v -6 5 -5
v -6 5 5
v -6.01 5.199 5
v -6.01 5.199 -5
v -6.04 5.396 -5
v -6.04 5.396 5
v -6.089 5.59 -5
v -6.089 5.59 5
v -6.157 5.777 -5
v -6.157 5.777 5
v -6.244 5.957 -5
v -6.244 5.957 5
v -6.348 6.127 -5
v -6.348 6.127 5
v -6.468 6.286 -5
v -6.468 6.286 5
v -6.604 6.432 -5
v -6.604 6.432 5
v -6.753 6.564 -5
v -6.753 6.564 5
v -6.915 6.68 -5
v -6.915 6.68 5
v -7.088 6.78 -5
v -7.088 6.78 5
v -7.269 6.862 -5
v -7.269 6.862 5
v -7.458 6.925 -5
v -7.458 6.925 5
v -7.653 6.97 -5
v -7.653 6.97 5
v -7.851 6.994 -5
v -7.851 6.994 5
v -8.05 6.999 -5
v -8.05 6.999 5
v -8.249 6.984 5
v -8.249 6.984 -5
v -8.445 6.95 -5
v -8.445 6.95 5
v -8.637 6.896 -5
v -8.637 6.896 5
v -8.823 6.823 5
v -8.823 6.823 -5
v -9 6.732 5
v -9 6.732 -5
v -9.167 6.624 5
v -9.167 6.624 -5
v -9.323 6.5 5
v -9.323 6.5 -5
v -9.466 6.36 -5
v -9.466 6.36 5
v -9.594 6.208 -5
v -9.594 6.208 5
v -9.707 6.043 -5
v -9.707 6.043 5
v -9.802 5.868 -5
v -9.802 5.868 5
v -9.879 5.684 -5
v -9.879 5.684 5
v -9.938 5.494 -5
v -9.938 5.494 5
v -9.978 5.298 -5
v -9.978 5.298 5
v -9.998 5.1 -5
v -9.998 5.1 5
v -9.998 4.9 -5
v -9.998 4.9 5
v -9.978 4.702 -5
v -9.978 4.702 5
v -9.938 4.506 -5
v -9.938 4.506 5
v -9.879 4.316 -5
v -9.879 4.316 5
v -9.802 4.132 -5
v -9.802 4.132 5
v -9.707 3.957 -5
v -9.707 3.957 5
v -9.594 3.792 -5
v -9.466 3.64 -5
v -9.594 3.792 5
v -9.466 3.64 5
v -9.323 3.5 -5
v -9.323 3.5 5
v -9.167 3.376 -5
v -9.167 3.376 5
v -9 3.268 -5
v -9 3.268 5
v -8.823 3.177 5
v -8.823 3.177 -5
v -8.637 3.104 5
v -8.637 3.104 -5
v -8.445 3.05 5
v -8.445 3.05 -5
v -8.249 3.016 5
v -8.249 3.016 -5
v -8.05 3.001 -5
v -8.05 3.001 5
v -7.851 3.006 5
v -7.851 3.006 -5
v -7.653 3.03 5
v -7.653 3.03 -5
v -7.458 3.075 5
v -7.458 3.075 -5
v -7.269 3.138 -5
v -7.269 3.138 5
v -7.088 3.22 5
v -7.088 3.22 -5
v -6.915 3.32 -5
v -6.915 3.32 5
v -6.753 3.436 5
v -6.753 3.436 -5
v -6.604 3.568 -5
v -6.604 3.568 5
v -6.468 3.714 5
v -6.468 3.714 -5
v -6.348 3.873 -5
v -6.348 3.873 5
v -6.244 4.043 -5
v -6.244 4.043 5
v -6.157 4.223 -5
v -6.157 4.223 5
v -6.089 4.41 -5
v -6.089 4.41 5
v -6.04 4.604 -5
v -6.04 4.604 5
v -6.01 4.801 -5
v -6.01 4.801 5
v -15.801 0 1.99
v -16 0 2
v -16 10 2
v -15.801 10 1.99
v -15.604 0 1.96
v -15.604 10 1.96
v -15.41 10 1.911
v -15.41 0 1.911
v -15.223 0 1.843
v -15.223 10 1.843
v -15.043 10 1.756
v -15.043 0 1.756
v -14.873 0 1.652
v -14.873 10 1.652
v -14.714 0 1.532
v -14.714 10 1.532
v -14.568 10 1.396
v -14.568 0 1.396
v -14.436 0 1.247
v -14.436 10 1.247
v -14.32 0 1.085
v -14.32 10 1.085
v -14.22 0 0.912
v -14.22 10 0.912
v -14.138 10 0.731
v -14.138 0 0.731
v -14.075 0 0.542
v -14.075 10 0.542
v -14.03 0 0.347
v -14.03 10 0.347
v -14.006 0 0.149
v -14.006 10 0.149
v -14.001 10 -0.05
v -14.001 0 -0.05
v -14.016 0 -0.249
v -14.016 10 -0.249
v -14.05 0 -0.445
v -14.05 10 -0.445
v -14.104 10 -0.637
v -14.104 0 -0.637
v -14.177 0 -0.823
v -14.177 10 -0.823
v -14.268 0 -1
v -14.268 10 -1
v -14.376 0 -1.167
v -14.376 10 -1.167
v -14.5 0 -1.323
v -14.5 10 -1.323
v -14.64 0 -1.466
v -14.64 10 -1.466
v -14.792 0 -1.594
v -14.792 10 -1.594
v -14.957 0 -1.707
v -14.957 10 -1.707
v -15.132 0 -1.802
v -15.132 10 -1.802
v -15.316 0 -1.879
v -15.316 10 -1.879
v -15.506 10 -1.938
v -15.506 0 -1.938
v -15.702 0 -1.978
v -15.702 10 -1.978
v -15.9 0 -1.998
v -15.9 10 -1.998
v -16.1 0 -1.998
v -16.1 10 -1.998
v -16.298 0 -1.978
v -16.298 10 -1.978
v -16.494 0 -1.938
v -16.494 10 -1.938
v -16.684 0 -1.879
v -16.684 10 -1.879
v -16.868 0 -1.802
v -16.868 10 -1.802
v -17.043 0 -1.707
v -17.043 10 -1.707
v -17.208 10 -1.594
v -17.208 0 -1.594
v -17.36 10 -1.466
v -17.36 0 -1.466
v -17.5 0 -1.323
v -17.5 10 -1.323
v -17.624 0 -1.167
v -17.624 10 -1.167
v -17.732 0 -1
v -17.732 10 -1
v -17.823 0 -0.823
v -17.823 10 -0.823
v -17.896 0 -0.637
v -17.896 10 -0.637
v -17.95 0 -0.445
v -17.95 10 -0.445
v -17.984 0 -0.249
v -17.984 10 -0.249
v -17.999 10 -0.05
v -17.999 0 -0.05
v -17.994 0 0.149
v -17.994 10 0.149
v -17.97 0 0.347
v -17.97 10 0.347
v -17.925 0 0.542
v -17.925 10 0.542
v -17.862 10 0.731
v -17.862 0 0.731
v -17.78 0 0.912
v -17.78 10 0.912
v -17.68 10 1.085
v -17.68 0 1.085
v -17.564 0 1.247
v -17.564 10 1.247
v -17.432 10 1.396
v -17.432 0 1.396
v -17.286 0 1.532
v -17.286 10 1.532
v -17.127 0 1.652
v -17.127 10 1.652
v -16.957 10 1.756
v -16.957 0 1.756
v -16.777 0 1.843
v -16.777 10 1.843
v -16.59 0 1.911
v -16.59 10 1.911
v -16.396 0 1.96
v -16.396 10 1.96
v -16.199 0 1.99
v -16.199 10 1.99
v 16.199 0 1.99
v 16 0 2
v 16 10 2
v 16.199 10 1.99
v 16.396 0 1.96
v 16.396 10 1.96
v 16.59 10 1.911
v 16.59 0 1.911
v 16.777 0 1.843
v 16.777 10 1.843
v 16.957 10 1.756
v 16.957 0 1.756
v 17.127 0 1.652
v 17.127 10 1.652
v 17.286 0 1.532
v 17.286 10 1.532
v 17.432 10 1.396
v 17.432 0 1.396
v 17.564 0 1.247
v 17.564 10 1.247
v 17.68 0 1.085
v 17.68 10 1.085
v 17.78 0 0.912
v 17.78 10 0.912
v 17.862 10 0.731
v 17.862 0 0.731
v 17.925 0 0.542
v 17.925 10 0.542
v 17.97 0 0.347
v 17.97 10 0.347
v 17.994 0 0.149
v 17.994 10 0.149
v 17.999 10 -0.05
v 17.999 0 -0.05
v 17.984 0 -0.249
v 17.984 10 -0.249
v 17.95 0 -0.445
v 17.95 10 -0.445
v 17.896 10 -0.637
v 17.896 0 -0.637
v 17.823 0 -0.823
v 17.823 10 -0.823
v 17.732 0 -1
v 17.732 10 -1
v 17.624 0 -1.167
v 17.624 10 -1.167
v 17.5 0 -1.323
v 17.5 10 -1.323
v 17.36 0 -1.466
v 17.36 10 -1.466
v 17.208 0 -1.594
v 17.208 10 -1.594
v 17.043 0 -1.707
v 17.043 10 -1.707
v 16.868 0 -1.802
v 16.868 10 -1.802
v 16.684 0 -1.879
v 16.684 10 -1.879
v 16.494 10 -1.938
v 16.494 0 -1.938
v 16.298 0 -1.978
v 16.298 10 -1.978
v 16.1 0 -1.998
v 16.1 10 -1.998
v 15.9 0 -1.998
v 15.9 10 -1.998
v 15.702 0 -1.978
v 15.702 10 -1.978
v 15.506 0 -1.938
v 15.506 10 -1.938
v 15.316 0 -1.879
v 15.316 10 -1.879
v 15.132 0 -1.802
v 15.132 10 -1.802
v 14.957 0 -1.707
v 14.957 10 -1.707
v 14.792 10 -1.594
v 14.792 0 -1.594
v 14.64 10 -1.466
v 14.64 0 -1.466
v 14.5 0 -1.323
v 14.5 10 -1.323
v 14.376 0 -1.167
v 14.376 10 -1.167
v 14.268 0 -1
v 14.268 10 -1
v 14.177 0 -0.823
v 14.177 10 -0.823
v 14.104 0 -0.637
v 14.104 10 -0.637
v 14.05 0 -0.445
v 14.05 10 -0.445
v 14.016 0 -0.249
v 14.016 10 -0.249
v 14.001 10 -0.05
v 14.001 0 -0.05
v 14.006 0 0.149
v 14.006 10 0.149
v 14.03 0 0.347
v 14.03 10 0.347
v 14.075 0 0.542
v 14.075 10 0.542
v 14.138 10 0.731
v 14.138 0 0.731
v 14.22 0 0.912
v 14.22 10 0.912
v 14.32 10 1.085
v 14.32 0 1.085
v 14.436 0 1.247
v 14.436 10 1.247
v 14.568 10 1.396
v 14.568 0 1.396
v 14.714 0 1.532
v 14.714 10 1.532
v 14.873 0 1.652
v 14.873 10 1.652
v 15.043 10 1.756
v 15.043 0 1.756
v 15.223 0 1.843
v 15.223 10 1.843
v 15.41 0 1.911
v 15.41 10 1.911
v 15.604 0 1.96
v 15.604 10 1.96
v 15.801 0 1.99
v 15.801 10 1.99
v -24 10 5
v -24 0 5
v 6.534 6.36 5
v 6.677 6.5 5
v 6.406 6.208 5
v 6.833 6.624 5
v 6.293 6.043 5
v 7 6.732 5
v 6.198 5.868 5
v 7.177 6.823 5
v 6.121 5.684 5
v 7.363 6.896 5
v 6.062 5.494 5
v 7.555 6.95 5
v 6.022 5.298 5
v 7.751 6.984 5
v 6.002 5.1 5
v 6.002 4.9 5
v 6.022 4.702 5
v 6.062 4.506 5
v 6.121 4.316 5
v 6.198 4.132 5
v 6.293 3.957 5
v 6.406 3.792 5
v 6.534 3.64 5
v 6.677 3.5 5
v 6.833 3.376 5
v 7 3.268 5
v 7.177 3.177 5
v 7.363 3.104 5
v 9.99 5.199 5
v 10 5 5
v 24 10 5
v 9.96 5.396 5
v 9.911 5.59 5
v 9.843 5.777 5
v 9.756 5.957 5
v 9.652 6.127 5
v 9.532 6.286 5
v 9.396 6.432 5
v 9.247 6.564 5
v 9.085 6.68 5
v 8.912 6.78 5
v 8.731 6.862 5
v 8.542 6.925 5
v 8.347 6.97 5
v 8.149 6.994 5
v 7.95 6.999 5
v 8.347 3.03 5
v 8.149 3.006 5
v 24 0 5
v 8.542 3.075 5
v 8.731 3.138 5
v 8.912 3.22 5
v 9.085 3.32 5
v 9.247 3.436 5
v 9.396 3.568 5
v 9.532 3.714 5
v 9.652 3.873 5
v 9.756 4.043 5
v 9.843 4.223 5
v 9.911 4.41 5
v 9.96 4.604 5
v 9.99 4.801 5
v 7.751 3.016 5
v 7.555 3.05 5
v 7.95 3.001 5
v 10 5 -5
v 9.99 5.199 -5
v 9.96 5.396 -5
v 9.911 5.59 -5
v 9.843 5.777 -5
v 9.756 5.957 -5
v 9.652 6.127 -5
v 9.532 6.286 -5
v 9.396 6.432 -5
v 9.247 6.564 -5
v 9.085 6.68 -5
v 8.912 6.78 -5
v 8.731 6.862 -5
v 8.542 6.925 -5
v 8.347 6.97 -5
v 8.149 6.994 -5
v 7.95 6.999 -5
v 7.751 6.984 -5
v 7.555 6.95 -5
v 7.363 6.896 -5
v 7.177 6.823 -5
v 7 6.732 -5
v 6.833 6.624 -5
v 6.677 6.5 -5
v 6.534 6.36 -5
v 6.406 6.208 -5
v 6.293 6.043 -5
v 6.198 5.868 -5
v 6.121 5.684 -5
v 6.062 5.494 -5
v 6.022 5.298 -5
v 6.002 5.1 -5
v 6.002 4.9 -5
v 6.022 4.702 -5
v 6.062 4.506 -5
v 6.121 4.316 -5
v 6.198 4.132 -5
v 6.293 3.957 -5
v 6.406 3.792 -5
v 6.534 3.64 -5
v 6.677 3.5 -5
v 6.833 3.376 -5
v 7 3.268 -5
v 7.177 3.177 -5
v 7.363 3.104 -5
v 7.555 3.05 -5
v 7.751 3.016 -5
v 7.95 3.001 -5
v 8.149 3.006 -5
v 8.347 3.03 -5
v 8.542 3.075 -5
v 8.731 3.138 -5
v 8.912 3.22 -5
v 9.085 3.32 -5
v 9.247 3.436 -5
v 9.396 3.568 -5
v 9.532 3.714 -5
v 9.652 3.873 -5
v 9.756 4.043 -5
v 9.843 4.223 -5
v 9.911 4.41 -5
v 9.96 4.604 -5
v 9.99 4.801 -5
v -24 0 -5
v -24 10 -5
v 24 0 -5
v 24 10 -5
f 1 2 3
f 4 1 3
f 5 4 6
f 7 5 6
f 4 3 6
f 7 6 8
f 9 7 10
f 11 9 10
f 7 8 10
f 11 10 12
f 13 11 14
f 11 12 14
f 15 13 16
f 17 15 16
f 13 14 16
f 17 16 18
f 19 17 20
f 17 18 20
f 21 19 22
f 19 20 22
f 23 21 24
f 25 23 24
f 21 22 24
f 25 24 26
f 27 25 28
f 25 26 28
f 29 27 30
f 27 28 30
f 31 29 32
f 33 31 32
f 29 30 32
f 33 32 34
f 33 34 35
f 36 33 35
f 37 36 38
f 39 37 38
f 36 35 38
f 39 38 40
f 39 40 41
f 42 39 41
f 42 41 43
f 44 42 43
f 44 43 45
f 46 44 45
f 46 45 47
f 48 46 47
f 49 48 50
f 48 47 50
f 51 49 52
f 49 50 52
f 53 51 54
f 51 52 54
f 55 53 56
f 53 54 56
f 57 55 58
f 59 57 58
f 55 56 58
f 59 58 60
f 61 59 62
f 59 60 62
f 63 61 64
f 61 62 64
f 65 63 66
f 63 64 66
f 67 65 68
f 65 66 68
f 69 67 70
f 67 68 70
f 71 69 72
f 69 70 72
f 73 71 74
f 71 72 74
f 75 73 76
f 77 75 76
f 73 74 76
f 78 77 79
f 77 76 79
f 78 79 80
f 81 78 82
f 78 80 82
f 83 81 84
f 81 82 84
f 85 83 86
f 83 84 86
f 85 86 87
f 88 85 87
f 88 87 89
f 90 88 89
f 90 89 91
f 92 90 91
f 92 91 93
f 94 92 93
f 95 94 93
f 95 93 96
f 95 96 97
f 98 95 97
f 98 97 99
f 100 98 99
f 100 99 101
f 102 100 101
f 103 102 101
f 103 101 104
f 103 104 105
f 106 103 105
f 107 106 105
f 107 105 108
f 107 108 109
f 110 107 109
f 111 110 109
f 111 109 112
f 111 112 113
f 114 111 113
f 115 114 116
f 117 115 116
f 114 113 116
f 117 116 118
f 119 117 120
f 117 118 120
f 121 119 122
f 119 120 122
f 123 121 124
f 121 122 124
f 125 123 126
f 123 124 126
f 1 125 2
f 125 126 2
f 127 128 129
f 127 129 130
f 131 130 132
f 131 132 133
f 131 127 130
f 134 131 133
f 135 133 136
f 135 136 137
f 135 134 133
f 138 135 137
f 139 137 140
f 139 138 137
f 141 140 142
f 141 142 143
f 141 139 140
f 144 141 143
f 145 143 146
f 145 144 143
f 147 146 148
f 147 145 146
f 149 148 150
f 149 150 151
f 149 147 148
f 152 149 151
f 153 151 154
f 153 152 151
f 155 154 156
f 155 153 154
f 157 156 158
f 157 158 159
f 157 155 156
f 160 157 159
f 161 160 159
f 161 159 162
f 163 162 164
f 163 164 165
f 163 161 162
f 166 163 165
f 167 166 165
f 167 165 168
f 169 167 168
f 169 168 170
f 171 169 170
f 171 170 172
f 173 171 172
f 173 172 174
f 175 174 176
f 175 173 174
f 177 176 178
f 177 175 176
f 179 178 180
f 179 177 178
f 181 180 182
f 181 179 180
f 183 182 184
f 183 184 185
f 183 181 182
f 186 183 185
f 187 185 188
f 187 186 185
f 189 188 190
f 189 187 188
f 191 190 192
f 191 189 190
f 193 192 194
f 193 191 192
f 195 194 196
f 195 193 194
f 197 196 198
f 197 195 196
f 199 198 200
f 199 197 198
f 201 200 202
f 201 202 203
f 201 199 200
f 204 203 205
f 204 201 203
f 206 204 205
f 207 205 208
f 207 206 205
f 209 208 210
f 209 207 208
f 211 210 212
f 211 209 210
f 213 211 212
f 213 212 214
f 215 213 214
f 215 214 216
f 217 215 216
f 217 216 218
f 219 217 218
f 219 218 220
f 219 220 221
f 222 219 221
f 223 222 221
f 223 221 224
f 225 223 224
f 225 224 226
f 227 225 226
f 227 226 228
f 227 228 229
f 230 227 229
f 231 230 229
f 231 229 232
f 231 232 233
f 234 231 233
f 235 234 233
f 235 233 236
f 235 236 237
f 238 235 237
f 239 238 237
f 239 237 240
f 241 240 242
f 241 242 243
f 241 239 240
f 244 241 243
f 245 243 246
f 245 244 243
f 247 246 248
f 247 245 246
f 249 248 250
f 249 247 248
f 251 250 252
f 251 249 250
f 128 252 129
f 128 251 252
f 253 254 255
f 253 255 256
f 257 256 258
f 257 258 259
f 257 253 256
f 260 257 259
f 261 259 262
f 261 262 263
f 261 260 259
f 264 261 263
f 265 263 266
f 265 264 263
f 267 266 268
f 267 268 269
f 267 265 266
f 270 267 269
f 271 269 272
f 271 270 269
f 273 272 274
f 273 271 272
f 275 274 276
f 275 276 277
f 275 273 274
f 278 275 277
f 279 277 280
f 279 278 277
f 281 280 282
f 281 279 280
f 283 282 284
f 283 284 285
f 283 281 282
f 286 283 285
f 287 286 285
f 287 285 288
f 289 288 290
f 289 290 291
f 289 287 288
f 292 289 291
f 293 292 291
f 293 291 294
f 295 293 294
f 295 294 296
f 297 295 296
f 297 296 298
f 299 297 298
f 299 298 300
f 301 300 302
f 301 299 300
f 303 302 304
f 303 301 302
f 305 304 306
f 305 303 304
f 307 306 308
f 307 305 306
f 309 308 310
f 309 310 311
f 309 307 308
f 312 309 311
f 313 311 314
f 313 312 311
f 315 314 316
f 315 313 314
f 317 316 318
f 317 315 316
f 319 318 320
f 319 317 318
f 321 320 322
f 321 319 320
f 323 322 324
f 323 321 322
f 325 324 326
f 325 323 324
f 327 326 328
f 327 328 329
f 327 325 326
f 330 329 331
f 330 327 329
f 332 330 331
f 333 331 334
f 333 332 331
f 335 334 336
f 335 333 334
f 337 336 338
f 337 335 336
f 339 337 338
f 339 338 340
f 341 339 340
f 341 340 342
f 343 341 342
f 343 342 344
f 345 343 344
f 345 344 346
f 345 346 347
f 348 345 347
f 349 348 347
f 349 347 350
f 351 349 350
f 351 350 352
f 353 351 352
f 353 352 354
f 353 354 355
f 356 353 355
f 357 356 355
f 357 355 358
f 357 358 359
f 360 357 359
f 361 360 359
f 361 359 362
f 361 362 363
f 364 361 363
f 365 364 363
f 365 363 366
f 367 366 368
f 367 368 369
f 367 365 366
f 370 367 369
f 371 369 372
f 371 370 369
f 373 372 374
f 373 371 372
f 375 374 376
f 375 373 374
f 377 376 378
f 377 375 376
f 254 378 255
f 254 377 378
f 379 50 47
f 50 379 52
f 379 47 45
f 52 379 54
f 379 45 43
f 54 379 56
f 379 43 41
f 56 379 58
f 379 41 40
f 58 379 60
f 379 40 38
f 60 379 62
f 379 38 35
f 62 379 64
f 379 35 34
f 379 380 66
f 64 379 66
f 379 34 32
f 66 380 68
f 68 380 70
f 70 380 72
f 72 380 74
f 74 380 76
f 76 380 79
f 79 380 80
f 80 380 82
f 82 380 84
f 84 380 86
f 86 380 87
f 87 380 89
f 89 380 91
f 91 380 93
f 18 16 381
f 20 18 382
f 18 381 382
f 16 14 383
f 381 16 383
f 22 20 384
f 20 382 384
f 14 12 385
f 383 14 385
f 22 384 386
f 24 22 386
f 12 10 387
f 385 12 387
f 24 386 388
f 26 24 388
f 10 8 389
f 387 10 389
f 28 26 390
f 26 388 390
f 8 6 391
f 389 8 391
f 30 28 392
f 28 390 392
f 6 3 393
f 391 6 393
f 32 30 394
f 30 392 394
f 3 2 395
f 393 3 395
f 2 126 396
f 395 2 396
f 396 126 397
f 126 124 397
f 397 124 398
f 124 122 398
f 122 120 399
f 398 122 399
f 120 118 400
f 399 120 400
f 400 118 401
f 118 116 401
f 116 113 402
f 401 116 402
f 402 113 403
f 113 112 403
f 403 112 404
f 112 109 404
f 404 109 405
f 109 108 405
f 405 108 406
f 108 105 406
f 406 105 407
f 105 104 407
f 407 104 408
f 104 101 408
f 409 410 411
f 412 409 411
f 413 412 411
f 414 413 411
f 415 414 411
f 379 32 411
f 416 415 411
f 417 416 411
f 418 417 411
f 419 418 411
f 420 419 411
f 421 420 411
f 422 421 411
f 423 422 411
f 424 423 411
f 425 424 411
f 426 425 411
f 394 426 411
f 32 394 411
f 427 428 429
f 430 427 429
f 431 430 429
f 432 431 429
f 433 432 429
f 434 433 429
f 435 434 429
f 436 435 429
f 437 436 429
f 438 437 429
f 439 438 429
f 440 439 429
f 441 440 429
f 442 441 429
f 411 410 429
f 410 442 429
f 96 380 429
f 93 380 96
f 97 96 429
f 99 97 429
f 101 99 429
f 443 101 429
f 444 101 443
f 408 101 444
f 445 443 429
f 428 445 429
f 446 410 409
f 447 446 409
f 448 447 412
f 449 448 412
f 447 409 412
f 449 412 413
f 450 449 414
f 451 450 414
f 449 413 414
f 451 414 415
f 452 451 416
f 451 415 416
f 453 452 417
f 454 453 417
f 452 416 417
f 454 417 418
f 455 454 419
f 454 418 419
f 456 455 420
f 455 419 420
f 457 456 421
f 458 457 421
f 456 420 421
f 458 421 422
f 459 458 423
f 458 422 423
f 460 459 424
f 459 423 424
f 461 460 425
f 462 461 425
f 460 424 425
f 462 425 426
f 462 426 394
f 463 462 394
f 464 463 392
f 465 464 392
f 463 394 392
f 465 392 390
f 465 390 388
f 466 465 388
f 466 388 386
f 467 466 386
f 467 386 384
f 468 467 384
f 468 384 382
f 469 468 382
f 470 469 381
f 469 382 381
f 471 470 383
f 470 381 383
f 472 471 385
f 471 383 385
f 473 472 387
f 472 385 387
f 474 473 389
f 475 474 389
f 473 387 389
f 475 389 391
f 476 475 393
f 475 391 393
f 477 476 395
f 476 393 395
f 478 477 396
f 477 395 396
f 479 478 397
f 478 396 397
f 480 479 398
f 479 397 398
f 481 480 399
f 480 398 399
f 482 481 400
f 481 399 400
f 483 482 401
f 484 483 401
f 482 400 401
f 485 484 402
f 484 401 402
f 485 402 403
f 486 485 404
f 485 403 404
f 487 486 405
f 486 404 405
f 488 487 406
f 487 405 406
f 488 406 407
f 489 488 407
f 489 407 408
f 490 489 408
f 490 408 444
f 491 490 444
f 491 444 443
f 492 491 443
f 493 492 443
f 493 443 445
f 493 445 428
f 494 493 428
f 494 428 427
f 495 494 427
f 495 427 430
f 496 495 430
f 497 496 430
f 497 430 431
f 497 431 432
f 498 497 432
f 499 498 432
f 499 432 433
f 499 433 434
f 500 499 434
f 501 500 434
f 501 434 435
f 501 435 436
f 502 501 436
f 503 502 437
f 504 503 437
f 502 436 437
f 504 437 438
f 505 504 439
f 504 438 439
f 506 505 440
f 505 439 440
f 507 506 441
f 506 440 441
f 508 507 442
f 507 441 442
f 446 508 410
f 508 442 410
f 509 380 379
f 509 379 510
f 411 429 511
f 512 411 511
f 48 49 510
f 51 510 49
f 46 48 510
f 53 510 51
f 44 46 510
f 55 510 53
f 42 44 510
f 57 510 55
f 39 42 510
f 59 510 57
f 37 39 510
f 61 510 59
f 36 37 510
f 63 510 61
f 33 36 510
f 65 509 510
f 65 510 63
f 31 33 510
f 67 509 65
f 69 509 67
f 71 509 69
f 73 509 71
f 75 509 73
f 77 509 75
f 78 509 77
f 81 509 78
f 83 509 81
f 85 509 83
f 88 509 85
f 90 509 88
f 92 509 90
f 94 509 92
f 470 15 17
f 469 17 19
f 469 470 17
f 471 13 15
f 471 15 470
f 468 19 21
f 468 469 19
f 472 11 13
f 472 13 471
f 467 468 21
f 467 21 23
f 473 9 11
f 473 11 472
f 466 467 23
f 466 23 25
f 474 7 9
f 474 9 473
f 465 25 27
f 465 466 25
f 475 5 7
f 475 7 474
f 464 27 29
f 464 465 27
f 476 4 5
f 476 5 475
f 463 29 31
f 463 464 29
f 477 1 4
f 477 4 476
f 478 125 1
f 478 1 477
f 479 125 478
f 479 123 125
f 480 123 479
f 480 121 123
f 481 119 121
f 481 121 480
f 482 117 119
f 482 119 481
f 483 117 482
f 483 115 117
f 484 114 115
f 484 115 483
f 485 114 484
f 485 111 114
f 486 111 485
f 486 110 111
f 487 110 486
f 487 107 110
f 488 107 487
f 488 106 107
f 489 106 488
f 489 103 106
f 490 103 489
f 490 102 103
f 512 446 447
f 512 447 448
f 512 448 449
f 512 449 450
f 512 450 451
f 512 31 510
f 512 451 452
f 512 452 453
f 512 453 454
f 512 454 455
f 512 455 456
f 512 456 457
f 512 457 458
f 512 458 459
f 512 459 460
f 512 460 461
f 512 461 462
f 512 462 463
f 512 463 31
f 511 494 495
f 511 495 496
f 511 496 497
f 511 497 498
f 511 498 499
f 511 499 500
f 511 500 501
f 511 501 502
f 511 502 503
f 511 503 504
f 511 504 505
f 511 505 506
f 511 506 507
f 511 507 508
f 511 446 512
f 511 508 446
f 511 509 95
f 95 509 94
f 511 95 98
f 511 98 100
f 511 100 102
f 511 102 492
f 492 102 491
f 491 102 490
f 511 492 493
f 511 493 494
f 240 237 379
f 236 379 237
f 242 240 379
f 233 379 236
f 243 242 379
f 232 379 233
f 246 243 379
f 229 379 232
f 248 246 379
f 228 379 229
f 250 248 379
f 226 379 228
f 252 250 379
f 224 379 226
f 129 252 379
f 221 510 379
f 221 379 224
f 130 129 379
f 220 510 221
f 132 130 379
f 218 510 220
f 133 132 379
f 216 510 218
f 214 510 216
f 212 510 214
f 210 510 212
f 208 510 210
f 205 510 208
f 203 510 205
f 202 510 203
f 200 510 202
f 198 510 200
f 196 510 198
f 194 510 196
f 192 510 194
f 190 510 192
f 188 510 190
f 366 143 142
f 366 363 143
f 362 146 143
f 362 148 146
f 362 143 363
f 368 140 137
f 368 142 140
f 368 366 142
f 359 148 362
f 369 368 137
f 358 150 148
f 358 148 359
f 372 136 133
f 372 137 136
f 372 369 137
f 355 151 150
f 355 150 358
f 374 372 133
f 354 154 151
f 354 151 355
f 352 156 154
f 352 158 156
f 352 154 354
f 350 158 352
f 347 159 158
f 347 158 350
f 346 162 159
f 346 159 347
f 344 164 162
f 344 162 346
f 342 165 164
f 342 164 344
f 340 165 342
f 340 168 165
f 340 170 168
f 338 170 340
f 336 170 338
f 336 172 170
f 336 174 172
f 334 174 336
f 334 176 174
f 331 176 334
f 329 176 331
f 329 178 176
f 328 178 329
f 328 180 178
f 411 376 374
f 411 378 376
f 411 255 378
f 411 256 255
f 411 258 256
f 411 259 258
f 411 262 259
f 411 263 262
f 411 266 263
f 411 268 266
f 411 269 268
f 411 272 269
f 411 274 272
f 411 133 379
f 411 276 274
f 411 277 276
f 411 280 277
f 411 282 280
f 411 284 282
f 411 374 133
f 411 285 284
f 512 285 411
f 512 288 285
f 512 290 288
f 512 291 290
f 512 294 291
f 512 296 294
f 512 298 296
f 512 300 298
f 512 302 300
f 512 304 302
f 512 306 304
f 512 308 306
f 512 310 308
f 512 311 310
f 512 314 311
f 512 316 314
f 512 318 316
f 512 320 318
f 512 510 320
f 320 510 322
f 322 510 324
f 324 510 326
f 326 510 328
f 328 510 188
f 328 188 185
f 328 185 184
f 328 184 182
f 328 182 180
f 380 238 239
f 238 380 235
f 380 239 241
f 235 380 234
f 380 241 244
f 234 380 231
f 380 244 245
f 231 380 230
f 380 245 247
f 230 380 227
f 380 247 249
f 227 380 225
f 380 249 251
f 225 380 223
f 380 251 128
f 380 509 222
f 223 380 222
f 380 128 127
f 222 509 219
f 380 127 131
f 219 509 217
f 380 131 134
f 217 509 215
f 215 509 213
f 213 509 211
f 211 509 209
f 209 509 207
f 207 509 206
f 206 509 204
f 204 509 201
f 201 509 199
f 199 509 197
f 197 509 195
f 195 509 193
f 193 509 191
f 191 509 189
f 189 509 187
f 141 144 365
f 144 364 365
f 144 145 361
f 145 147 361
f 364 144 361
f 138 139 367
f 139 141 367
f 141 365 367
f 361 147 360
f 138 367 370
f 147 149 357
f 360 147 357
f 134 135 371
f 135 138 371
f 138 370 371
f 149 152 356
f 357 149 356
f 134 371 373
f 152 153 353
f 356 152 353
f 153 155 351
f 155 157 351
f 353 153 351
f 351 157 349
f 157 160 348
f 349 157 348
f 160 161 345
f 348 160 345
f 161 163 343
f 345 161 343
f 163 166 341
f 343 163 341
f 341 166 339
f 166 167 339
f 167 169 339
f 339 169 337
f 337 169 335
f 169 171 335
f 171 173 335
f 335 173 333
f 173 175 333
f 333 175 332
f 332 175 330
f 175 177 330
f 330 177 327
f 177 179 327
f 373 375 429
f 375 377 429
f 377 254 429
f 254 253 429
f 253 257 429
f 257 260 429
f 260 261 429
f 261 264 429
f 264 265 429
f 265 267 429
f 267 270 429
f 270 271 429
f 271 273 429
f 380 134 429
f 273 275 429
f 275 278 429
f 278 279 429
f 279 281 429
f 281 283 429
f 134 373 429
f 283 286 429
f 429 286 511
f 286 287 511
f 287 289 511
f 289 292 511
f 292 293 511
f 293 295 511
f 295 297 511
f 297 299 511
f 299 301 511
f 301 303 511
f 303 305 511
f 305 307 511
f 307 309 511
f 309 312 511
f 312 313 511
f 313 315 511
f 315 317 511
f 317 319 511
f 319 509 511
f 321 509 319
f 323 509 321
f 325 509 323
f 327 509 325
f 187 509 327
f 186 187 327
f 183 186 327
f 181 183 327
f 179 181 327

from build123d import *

# Parameters (mm, degrees)
SKETCH_1_W          = 48
SKETCH_1_H          = 10
SKETCH_1_R          = 2
EXTRUDE_1_DEPTH     = 10
SKETCH_2_R          = 2
CUT_EXTRUDE_1_DEPTH = 10


with BuildPart() as part:
    # 草图1 → 凸台-拉伸1 (new body)
    with BuildSketch(Plane(origin=(0, 0, 0), x_dir=(1, 0, 0), z_dir=(0, 1, 0))):
        Rectangle(SKETCH_1_W, SKETCH_1_H)
        with Locations(Location((16, 0, 0), (0, 0, 270))):
            Circle(SKETCH_1_R, mode=Mode.SUBTRACT)
        with Locations(Location((-16, 0, 0), (0, 0, 270))):
            Circle(SKETCH_1_R, mode=Mode.SUBTRACT)
    extrude(amount=EXTRUDE_1_DEPTH)

    # 草图2 → 切除-拉伸1 (cut)
    with BuildSketch(Plane.XY.offset(5)):
        with Locations((-8, 5)):
            Circle(SKETCH_2_R)
        with Locations((8, 5)):
            Circle(SKETCH_2_R)
    extrude(amount=-CUT_EXTRUDE_1_DEPTH, mode=Mode.SUBTRACT)


solid = part.part
